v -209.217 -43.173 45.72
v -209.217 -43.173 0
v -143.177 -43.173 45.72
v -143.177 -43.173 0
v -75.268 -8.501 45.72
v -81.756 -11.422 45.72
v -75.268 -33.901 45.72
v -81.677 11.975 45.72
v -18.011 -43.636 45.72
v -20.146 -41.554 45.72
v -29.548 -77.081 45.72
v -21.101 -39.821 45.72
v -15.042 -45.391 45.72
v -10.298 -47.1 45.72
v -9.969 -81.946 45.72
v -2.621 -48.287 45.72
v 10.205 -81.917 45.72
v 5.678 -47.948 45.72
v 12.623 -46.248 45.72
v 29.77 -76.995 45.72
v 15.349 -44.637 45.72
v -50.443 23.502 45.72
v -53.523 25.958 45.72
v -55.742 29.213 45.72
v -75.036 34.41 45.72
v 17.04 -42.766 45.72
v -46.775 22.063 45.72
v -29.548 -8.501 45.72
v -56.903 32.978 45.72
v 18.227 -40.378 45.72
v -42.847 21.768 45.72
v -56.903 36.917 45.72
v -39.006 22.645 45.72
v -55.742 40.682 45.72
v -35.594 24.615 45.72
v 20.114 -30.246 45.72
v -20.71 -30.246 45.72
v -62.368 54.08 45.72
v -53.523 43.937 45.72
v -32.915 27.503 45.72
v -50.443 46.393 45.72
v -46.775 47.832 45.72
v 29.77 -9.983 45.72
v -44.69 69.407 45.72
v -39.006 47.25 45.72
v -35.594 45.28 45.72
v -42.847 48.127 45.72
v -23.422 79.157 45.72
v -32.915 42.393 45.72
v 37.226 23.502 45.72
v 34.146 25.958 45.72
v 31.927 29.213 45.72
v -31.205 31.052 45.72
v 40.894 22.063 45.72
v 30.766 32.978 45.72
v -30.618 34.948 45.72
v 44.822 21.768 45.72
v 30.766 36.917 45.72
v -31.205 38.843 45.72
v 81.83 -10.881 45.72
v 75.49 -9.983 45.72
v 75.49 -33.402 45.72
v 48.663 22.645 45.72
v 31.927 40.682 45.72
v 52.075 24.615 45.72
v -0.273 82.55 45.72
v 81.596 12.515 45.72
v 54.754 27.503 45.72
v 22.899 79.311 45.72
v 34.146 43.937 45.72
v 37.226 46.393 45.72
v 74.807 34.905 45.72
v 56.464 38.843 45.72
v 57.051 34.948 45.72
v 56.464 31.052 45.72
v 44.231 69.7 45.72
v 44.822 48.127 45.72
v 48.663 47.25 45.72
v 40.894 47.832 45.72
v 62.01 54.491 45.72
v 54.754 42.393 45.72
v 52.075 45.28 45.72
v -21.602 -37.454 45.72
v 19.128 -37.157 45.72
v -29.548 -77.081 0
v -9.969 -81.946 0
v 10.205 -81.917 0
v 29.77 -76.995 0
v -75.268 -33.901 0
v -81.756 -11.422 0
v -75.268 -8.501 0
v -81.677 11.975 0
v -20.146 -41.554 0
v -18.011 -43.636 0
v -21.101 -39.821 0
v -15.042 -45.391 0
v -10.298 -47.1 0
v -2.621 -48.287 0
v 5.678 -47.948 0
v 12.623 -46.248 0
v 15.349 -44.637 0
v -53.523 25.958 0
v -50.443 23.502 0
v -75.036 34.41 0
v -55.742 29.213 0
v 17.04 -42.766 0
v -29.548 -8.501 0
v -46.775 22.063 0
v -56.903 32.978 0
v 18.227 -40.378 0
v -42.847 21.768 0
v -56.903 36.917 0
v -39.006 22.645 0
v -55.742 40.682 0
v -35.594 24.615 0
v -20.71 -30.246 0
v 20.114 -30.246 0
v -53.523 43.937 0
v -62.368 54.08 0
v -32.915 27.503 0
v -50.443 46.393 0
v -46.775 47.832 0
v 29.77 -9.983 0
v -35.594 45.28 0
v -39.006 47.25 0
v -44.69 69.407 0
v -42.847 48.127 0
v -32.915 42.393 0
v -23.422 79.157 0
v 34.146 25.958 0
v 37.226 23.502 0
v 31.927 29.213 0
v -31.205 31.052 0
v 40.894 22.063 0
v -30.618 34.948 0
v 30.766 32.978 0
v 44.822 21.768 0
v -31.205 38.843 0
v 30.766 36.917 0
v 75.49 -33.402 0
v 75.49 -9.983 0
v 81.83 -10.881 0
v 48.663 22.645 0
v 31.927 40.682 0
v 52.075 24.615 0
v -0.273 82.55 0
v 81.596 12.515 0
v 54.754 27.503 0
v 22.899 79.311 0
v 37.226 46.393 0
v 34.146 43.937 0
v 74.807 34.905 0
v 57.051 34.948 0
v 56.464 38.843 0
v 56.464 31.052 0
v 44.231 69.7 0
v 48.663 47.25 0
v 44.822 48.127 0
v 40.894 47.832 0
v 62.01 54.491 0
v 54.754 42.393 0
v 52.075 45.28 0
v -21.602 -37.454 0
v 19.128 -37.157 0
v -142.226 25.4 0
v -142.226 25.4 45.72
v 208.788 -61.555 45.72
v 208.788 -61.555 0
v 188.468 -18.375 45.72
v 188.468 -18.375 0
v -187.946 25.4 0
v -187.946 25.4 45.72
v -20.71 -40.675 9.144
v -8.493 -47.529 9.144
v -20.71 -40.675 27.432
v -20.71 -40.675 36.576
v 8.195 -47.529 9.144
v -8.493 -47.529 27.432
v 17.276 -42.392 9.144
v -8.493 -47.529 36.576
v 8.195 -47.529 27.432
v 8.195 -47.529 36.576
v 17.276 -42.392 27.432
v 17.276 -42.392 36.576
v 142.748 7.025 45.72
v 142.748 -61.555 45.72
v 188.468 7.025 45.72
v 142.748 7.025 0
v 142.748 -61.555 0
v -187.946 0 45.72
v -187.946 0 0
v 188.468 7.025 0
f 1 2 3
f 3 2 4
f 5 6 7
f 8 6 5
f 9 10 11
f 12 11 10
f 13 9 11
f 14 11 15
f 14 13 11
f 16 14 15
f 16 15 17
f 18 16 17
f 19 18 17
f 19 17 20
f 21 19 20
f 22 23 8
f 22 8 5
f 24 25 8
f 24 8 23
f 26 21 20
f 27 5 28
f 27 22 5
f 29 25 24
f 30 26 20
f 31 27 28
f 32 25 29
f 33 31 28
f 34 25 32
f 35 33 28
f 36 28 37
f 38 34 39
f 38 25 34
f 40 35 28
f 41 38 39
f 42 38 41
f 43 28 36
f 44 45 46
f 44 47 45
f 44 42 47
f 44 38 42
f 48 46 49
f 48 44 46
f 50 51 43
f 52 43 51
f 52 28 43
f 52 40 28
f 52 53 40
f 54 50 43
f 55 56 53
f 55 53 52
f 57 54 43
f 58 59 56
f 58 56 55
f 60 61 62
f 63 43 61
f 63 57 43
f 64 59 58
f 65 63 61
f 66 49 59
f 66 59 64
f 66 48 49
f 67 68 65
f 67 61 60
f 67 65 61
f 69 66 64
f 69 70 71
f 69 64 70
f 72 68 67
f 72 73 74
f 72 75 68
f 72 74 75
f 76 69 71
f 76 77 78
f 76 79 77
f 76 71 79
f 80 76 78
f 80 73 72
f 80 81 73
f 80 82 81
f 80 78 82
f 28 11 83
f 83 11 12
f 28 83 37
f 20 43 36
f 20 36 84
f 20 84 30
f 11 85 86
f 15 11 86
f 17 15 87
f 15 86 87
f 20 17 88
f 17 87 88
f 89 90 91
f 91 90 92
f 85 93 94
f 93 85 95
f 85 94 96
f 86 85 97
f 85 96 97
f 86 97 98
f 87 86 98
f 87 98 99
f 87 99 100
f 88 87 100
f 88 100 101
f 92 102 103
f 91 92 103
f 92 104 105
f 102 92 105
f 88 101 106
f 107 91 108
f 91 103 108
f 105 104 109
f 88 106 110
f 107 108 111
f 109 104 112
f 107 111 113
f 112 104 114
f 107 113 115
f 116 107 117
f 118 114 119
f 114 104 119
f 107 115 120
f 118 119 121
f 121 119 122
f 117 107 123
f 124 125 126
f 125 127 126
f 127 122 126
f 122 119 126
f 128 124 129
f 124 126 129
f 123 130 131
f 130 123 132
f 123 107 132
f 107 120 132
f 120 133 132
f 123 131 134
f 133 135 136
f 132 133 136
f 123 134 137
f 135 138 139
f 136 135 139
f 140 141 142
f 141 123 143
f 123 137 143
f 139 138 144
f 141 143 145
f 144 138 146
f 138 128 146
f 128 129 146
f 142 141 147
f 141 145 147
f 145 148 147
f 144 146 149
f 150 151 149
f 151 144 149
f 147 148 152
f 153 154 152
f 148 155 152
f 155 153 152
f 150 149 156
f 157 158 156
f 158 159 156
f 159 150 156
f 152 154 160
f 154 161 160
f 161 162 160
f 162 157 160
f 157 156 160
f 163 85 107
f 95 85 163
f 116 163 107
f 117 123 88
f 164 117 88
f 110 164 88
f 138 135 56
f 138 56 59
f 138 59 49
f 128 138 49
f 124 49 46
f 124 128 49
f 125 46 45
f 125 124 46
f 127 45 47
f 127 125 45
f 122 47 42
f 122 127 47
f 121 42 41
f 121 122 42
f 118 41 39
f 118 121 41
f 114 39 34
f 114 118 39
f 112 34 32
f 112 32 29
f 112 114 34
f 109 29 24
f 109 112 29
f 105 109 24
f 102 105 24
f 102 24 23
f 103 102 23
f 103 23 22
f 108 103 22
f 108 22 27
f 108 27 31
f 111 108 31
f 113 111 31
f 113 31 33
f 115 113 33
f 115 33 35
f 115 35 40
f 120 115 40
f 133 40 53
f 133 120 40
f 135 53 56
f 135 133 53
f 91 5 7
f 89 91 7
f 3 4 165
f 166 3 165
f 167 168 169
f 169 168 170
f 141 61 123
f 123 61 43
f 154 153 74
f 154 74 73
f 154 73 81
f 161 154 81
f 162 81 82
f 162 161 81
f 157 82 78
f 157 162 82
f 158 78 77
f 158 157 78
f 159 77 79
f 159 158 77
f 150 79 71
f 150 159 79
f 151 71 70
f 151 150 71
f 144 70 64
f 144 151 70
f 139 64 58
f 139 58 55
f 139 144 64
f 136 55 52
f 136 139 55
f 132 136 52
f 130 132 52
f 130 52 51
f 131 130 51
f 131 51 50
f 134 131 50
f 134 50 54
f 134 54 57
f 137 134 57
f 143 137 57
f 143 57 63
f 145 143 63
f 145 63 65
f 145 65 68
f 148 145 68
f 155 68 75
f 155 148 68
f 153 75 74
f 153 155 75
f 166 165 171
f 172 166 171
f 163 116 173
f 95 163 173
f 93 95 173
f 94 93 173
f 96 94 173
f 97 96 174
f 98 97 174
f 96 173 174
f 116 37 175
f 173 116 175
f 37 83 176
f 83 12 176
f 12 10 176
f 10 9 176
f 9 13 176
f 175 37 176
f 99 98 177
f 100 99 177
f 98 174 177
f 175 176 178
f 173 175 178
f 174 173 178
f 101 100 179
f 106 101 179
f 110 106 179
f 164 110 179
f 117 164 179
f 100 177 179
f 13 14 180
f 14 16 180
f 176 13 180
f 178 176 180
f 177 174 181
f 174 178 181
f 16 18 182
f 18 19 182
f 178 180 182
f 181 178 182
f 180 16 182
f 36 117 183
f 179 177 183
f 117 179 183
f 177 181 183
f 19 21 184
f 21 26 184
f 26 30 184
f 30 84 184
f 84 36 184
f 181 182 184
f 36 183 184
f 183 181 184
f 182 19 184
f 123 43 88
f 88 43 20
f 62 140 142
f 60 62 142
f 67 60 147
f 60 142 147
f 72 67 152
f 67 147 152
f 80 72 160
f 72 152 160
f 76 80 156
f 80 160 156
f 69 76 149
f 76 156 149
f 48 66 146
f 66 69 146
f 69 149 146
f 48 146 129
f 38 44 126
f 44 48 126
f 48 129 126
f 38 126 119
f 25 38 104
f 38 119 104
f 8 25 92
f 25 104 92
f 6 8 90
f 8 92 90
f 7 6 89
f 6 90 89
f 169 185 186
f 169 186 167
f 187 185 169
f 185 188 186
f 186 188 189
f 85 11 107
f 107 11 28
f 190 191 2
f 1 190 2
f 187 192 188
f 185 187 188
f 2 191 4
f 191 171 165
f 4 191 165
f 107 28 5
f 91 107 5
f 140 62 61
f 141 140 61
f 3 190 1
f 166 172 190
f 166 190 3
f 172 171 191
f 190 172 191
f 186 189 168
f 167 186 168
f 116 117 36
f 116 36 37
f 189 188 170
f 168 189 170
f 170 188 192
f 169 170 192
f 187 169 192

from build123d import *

# Parameters (mm, degrees)
F0_R     = 82.55
F0_R_2   = 13.2161840286
F1_DEPTH = 45.72
F3_DEPTH = 45.72
F5_DEPTH = 45.72
F7_DEPTH = 45.72
F9_DEPTH = 45.72


with BuildPart() as f1:
    # F0 (on Top) → F1 (new body)
    with BuildSketch(Plane.XY):
        Circle(F0_R)
        with Locations((-43.8344989988, 34.9475856532)):
            Circle(F0_R_2, mode=Mode.SUBTRACT)
        with Locations((43.8344989988, 34.9475856532)):
            Circle(F0_R_2, mode=Mode.SUBTRACT)
    extrude(amount=F1_DEPTH)

    # F2 (on face) → F3 (cut)
    with BuildSketch(Plane.XY.offset(45.72)):
        with BuildLine():
            Line((20.1142486185, -30.2458666265), (-20.7102242857, -30.2458666265))
            add(Edge.make_bspline(
                [(-20.7102242857, -30.2458666265), (-21.5095821677, -33.9895845007), (-23.2353545013, -42.0720778093), (-8.2458384912, -48.9650793457), (7.921874901, -48.3110472906), (18.5336653767, -44.2743095129), (19.5611474732, -35.1549075564), (20.1142486185, -30.2458666265)],
                knots=[0, 0, 0, 0, 0.1812969077, 0.3914106492, 0.6207351021, 0.795838925, 1, 1, 1, 1], degree=3))
        make_face()
    extrude(amount=-F3_DEPTH, mode=Mode.SUBTRACT)

    # F4 (on face) → F5 (cut)
    with BuildSketch(Plane.XY.offset(45.72)):
        with BuildLine():
            Line((-75.2678418537, -8.5006560804), (-75.2678418537, -33.9006560804))
            ThreePointArc((-75.2678418537, -33.9006560804), (-56.6807726462, -60.014935743), (-29.5478418537, -77.0806560804))
            Line((-29.5478418537, -77.0806560804), (-29.5478418537, -8.5006560804))
            Line((-29.5478418537, -8.5006560804), (-75.2678418537, -8.5006560804))
        make_face()
        with BuildLine():
            ThreePointArc((29.7703243229, -76.995001719), (56.9651825082, -59.7450456675), (75.4903243229, -33.4022968315))
            Line((75.4903243229, -33.4022968315), (75.4903243229, -9.9825717488))
            Line((75.4903243229, -9.9825717488), (29.7703243229, -9.9825717488))
            Line((29.7703243229, -9.9825717488), (29.7703243229, -76.995001719))
        make_face()
    extrude(amount=-F5_DEPTH, mode=Mode.SUBTRACT)


with BuildPart() as f7:
    # F6 (on Top) → F7 (new body)
    with BuildSketch(Plane.XY):
        Polygon((-142.2258148932, 25.4), (-187.9458148932, 25.4), (-187.9458148932, 0), (-209.2173760553, -43.1733981319), (-143.1773760553, -43.1733981319), align=None)
    extrude(amount=F7_DEPTH)


with BuildPart() as f9:
    # F8 (on Top) → F9 (new body)
    with BuildSketch(Plane.XY):
        Polygon((188.4676078524, 7.0249855754), (142.7476078524, 7.0249855754), (142.7476078524, -61.5550144246), (208.7876078524, -61.5550144246), (188.4676078524, -18.3750144246), align=None)
    extrude(amount=F9_DEPTH)


solid = Compound([f1.part, f7.part, f9.part])
